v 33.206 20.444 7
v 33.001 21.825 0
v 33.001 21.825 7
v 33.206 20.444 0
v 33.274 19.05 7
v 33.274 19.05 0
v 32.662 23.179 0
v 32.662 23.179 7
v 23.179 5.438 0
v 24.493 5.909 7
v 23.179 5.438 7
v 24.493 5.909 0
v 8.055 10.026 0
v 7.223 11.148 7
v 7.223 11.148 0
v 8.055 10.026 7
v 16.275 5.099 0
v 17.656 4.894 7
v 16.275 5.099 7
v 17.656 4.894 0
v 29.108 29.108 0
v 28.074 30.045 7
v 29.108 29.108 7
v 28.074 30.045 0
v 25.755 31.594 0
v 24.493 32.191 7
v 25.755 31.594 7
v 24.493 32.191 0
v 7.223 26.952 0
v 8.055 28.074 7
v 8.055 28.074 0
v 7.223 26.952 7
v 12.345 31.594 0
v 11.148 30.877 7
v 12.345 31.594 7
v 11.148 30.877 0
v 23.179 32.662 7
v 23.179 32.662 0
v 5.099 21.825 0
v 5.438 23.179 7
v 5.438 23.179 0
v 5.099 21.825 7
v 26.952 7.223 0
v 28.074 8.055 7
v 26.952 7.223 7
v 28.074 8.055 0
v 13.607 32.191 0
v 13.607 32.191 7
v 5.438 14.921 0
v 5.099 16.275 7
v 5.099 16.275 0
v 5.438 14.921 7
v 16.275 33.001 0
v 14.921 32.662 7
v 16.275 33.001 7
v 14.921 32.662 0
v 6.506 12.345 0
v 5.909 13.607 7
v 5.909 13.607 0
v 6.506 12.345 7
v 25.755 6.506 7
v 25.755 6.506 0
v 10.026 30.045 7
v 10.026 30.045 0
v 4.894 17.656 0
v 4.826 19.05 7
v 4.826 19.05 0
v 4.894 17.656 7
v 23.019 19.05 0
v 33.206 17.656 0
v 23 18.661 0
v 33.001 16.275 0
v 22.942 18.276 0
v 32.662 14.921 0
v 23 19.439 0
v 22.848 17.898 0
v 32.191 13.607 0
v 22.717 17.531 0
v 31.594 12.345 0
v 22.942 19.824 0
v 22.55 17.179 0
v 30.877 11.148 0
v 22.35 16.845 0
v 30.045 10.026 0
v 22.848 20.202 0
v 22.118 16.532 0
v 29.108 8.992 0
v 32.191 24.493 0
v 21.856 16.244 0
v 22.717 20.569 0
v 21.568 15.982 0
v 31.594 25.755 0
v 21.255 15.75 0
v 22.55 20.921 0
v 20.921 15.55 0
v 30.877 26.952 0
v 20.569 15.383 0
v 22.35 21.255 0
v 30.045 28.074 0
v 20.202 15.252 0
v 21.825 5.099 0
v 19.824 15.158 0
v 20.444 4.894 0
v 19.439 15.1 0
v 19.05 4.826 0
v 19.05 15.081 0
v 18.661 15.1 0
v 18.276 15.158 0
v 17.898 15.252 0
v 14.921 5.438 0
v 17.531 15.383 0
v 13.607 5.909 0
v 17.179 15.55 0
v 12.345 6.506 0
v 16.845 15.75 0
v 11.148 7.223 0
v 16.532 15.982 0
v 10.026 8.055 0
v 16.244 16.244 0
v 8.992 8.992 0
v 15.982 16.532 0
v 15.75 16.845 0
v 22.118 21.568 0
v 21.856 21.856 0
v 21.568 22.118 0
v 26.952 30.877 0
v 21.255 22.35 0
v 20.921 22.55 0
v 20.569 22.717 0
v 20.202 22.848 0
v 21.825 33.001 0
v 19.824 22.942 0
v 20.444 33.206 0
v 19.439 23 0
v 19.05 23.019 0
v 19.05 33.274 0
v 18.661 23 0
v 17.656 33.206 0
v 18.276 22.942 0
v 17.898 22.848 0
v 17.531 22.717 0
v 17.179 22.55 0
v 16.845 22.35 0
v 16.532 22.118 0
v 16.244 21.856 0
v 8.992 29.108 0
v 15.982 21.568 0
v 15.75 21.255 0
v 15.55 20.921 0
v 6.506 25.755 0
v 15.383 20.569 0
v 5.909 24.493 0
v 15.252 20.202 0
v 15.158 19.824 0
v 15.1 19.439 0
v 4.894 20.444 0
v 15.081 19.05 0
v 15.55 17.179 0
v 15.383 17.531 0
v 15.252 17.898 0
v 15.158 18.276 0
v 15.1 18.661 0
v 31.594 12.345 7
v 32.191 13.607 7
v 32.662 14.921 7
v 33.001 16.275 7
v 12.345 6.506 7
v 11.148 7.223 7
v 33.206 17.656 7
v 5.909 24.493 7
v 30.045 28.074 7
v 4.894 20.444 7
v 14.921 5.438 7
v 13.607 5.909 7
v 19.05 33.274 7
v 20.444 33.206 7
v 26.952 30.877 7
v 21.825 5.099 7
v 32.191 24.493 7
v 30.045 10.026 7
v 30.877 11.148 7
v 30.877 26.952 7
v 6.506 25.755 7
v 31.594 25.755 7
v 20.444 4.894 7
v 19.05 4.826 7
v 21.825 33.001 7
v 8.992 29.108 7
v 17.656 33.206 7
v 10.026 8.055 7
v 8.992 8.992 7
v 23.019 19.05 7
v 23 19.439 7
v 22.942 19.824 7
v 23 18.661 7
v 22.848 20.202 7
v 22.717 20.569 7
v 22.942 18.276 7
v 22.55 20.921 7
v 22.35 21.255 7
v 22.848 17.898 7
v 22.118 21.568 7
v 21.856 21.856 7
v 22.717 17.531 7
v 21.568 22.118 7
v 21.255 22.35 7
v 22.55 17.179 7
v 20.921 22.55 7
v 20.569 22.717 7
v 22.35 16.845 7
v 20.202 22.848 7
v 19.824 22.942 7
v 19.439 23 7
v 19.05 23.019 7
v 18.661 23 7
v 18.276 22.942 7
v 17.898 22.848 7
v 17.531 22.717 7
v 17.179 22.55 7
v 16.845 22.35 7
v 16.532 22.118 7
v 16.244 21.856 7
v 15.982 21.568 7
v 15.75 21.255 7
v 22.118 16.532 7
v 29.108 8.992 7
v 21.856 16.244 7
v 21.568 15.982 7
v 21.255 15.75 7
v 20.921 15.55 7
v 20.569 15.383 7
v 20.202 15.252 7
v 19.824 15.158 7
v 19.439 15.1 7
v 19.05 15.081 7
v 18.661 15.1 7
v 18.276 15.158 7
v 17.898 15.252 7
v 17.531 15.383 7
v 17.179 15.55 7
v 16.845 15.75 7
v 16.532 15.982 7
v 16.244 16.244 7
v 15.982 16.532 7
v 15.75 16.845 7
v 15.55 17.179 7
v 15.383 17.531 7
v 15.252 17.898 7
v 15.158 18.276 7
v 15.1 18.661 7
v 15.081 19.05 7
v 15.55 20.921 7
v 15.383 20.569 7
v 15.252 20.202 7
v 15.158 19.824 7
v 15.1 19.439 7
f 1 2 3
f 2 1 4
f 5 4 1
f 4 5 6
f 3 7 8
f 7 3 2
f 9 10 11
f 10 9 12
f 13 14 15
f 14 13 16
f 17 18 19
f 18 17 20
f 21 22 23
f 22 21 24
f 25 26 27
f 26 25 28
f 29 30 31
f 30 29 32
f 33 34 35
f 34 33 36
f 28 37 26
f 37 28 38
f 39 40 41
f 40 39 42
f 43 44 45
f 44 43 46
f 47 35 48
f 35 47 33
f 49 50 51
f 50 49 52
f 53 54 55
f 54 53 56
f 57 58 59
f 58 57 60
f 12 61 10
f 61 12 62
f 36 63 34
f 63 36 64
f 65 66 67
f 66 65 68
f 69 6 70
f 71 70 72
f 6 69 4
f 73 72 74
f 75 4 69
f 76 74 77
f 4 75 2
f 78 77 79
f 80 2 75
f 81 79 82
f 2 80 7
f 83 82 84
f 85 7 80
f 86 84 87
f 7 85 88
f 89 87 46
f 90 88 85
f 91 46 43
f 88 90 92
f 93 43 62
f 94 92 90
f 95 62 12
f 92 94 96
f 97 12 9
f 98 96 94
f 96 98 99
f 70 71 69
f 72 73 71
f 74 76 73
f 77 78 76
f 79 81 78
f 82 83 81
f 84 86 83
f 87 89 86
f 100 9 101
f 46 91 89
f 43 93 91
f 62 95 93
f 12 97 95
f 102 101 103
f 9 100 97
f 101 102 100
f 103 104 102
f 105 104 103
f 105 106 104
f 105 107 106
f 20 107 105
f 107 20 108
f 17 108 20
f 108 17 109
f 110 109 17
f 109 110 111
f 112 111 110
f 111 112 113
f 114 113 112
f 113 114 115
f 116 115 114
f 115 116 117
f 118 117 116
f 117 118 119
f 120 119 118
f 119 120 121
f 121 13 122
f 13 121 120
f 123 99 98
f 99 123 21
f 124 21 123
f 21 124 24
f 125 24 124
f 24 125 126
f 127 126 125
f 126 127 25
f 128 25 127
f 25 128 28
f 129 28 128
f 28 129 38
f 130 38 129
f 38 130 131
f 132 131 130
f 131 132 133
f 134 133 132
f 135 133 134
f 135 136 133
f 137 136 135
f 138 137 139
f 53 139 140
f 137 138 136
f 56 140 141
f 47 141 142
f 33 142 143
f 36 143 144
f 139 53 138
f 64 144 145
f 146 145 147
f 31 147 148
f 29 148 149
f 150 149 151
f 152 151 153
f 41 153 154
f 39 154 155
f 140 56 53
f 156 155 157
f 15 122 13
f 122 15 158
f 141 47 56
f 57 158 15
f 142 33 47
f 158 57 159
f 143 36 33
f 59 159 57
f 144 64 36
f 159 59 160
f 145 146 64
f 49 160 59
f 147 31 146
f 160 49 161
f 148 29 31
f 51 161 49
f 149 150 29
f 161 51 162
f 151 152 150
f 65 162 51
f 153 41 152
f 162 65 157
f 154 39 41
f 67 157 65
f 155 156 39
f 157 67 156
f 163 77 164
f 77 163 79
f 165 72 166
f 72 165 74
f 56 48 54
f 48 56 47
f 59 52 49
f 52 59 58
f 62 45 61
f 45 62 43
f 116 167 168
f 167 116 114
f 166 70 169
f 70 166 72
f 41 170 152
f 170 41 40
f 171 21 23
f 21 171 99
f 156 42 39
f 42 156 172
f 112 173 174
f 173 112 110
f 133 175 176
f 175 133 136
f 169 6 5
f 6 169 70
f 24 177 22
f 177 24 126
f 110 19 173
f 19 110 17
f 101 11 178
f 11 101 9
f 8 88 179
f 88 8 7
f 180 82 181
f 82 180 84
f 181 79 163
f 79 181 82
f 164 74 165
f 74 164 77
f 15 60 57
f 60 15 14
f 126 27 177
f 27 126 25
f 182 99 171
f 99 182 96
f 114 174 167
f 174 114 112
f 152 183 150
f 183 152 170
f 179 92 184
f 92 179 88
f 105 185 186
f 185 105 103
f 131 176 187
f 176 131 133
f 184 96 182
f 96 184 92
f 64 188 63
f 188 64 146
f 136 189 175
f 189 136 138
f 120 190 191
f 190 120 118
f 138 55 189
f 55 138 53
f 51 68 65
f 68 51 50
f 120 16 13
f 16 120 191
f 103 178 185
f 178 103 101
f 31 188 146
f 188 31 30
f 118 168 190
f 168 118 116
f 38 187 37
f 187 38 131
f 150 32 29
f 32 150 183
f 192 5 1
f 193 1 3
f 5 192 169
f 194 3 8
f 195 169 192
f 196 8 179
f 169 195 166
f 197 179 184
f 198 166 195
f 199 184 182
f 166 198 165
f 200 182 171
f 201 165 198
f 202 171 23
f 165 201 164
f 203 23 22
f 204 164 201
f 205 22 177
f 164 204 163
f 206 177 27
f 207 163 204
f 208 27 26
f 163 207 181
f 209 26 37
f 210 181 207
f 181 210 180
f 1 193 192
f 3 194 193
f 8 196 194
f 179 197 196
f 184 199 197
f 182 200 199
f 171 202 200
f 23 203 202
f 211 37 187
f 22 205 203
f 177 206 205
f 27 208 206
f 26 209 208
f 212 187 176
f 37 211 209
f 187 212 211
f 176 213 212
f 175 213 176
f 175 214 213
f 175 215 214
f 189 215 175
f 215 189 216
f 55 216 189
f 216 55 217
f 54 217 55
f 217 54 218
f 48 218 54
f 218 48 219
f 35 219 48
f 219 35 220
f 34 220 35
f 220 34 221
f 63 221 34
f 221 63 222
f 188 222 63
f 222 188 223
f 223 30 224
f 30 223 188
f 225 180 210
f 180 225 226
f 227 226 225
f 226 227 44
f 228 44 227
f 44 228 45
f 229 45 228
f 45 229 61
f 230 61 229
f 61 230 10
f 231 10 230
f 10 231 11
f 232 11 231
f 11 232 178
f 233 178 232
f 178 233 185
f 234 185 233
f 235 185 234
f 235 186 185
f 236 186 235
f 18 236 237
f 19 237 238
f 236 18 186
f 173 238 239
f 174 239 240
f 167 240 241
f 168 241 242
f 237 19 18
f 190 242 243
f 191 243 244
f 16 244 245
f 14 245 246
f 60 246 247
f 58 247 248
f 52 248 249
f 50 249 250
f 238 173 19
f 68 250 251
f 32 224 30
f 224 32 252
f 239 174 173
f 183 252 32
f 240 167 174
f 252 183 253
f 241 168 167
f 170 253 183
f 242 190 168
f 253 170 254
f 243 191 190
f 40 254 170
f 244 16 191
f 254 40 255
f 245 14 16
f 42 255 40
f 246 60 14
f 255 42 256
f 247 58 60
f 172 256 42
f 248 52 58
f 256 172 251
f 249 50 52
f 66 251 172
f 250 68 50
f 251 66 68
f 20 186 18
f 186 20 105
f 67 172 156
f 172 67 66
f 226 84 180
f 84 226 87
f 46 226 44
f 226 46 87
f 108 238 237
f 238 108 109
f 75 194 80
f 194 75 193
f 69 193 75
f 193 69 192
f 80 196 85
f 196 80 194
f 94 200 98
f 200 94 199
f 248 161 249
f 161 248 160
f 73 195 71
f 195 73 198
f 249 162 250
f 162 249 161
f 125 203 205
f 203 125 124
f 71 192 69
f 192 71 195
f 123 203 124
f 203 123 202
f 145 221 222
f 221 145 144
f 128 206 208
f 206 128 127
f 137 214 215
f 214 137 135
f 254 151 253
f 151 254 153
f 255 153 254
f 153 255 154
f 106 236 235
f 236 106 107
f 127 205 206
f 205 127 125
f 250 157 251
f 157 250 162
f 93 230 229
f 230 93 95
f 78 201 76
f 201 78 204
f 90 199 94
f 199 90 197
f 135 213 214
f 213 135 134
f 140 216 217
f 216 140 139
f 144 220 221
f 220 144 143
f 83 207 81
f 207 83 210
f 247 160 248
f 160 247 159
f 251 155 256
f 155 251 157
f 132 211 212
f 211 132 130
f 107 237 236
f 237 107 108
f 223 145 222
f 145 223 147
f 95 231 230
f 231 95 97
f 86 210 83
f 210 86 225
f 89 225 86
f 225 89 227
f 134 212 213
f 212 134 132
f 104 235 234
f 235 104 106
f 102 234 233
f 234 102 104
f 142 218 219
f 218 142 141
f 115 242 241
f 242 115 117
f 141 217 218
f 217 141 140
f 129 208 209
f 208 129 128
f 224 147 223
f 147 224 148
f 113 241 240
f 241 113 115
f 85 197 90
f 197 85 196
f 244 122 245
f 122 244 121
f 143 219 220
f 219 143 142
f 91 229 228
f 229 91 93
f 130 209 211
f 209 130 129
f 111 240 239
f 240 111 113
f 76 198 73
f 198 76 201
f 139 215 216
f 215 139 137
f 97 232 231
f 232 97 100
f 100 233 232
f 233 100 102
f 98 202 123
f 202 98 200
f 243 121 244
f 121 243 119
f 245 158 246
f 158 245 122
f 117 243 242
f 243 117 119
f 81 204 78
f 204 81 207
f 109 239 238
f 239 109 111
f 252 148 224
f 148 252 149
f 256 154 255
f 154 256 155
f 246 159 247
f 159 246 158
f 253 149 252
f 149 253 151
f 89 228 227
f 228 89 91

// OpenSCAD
$inch = 25.4;

translate([0.75*$inch,0.75*$inch,0]) {
    difference() {
        cylinder(d=1.12*$inch, h=7, $fn=64);
        translate([00,0,-1]) {
            cylinder(d=5/16*$inch, h=9, $fn=64);
        }
    }
}
